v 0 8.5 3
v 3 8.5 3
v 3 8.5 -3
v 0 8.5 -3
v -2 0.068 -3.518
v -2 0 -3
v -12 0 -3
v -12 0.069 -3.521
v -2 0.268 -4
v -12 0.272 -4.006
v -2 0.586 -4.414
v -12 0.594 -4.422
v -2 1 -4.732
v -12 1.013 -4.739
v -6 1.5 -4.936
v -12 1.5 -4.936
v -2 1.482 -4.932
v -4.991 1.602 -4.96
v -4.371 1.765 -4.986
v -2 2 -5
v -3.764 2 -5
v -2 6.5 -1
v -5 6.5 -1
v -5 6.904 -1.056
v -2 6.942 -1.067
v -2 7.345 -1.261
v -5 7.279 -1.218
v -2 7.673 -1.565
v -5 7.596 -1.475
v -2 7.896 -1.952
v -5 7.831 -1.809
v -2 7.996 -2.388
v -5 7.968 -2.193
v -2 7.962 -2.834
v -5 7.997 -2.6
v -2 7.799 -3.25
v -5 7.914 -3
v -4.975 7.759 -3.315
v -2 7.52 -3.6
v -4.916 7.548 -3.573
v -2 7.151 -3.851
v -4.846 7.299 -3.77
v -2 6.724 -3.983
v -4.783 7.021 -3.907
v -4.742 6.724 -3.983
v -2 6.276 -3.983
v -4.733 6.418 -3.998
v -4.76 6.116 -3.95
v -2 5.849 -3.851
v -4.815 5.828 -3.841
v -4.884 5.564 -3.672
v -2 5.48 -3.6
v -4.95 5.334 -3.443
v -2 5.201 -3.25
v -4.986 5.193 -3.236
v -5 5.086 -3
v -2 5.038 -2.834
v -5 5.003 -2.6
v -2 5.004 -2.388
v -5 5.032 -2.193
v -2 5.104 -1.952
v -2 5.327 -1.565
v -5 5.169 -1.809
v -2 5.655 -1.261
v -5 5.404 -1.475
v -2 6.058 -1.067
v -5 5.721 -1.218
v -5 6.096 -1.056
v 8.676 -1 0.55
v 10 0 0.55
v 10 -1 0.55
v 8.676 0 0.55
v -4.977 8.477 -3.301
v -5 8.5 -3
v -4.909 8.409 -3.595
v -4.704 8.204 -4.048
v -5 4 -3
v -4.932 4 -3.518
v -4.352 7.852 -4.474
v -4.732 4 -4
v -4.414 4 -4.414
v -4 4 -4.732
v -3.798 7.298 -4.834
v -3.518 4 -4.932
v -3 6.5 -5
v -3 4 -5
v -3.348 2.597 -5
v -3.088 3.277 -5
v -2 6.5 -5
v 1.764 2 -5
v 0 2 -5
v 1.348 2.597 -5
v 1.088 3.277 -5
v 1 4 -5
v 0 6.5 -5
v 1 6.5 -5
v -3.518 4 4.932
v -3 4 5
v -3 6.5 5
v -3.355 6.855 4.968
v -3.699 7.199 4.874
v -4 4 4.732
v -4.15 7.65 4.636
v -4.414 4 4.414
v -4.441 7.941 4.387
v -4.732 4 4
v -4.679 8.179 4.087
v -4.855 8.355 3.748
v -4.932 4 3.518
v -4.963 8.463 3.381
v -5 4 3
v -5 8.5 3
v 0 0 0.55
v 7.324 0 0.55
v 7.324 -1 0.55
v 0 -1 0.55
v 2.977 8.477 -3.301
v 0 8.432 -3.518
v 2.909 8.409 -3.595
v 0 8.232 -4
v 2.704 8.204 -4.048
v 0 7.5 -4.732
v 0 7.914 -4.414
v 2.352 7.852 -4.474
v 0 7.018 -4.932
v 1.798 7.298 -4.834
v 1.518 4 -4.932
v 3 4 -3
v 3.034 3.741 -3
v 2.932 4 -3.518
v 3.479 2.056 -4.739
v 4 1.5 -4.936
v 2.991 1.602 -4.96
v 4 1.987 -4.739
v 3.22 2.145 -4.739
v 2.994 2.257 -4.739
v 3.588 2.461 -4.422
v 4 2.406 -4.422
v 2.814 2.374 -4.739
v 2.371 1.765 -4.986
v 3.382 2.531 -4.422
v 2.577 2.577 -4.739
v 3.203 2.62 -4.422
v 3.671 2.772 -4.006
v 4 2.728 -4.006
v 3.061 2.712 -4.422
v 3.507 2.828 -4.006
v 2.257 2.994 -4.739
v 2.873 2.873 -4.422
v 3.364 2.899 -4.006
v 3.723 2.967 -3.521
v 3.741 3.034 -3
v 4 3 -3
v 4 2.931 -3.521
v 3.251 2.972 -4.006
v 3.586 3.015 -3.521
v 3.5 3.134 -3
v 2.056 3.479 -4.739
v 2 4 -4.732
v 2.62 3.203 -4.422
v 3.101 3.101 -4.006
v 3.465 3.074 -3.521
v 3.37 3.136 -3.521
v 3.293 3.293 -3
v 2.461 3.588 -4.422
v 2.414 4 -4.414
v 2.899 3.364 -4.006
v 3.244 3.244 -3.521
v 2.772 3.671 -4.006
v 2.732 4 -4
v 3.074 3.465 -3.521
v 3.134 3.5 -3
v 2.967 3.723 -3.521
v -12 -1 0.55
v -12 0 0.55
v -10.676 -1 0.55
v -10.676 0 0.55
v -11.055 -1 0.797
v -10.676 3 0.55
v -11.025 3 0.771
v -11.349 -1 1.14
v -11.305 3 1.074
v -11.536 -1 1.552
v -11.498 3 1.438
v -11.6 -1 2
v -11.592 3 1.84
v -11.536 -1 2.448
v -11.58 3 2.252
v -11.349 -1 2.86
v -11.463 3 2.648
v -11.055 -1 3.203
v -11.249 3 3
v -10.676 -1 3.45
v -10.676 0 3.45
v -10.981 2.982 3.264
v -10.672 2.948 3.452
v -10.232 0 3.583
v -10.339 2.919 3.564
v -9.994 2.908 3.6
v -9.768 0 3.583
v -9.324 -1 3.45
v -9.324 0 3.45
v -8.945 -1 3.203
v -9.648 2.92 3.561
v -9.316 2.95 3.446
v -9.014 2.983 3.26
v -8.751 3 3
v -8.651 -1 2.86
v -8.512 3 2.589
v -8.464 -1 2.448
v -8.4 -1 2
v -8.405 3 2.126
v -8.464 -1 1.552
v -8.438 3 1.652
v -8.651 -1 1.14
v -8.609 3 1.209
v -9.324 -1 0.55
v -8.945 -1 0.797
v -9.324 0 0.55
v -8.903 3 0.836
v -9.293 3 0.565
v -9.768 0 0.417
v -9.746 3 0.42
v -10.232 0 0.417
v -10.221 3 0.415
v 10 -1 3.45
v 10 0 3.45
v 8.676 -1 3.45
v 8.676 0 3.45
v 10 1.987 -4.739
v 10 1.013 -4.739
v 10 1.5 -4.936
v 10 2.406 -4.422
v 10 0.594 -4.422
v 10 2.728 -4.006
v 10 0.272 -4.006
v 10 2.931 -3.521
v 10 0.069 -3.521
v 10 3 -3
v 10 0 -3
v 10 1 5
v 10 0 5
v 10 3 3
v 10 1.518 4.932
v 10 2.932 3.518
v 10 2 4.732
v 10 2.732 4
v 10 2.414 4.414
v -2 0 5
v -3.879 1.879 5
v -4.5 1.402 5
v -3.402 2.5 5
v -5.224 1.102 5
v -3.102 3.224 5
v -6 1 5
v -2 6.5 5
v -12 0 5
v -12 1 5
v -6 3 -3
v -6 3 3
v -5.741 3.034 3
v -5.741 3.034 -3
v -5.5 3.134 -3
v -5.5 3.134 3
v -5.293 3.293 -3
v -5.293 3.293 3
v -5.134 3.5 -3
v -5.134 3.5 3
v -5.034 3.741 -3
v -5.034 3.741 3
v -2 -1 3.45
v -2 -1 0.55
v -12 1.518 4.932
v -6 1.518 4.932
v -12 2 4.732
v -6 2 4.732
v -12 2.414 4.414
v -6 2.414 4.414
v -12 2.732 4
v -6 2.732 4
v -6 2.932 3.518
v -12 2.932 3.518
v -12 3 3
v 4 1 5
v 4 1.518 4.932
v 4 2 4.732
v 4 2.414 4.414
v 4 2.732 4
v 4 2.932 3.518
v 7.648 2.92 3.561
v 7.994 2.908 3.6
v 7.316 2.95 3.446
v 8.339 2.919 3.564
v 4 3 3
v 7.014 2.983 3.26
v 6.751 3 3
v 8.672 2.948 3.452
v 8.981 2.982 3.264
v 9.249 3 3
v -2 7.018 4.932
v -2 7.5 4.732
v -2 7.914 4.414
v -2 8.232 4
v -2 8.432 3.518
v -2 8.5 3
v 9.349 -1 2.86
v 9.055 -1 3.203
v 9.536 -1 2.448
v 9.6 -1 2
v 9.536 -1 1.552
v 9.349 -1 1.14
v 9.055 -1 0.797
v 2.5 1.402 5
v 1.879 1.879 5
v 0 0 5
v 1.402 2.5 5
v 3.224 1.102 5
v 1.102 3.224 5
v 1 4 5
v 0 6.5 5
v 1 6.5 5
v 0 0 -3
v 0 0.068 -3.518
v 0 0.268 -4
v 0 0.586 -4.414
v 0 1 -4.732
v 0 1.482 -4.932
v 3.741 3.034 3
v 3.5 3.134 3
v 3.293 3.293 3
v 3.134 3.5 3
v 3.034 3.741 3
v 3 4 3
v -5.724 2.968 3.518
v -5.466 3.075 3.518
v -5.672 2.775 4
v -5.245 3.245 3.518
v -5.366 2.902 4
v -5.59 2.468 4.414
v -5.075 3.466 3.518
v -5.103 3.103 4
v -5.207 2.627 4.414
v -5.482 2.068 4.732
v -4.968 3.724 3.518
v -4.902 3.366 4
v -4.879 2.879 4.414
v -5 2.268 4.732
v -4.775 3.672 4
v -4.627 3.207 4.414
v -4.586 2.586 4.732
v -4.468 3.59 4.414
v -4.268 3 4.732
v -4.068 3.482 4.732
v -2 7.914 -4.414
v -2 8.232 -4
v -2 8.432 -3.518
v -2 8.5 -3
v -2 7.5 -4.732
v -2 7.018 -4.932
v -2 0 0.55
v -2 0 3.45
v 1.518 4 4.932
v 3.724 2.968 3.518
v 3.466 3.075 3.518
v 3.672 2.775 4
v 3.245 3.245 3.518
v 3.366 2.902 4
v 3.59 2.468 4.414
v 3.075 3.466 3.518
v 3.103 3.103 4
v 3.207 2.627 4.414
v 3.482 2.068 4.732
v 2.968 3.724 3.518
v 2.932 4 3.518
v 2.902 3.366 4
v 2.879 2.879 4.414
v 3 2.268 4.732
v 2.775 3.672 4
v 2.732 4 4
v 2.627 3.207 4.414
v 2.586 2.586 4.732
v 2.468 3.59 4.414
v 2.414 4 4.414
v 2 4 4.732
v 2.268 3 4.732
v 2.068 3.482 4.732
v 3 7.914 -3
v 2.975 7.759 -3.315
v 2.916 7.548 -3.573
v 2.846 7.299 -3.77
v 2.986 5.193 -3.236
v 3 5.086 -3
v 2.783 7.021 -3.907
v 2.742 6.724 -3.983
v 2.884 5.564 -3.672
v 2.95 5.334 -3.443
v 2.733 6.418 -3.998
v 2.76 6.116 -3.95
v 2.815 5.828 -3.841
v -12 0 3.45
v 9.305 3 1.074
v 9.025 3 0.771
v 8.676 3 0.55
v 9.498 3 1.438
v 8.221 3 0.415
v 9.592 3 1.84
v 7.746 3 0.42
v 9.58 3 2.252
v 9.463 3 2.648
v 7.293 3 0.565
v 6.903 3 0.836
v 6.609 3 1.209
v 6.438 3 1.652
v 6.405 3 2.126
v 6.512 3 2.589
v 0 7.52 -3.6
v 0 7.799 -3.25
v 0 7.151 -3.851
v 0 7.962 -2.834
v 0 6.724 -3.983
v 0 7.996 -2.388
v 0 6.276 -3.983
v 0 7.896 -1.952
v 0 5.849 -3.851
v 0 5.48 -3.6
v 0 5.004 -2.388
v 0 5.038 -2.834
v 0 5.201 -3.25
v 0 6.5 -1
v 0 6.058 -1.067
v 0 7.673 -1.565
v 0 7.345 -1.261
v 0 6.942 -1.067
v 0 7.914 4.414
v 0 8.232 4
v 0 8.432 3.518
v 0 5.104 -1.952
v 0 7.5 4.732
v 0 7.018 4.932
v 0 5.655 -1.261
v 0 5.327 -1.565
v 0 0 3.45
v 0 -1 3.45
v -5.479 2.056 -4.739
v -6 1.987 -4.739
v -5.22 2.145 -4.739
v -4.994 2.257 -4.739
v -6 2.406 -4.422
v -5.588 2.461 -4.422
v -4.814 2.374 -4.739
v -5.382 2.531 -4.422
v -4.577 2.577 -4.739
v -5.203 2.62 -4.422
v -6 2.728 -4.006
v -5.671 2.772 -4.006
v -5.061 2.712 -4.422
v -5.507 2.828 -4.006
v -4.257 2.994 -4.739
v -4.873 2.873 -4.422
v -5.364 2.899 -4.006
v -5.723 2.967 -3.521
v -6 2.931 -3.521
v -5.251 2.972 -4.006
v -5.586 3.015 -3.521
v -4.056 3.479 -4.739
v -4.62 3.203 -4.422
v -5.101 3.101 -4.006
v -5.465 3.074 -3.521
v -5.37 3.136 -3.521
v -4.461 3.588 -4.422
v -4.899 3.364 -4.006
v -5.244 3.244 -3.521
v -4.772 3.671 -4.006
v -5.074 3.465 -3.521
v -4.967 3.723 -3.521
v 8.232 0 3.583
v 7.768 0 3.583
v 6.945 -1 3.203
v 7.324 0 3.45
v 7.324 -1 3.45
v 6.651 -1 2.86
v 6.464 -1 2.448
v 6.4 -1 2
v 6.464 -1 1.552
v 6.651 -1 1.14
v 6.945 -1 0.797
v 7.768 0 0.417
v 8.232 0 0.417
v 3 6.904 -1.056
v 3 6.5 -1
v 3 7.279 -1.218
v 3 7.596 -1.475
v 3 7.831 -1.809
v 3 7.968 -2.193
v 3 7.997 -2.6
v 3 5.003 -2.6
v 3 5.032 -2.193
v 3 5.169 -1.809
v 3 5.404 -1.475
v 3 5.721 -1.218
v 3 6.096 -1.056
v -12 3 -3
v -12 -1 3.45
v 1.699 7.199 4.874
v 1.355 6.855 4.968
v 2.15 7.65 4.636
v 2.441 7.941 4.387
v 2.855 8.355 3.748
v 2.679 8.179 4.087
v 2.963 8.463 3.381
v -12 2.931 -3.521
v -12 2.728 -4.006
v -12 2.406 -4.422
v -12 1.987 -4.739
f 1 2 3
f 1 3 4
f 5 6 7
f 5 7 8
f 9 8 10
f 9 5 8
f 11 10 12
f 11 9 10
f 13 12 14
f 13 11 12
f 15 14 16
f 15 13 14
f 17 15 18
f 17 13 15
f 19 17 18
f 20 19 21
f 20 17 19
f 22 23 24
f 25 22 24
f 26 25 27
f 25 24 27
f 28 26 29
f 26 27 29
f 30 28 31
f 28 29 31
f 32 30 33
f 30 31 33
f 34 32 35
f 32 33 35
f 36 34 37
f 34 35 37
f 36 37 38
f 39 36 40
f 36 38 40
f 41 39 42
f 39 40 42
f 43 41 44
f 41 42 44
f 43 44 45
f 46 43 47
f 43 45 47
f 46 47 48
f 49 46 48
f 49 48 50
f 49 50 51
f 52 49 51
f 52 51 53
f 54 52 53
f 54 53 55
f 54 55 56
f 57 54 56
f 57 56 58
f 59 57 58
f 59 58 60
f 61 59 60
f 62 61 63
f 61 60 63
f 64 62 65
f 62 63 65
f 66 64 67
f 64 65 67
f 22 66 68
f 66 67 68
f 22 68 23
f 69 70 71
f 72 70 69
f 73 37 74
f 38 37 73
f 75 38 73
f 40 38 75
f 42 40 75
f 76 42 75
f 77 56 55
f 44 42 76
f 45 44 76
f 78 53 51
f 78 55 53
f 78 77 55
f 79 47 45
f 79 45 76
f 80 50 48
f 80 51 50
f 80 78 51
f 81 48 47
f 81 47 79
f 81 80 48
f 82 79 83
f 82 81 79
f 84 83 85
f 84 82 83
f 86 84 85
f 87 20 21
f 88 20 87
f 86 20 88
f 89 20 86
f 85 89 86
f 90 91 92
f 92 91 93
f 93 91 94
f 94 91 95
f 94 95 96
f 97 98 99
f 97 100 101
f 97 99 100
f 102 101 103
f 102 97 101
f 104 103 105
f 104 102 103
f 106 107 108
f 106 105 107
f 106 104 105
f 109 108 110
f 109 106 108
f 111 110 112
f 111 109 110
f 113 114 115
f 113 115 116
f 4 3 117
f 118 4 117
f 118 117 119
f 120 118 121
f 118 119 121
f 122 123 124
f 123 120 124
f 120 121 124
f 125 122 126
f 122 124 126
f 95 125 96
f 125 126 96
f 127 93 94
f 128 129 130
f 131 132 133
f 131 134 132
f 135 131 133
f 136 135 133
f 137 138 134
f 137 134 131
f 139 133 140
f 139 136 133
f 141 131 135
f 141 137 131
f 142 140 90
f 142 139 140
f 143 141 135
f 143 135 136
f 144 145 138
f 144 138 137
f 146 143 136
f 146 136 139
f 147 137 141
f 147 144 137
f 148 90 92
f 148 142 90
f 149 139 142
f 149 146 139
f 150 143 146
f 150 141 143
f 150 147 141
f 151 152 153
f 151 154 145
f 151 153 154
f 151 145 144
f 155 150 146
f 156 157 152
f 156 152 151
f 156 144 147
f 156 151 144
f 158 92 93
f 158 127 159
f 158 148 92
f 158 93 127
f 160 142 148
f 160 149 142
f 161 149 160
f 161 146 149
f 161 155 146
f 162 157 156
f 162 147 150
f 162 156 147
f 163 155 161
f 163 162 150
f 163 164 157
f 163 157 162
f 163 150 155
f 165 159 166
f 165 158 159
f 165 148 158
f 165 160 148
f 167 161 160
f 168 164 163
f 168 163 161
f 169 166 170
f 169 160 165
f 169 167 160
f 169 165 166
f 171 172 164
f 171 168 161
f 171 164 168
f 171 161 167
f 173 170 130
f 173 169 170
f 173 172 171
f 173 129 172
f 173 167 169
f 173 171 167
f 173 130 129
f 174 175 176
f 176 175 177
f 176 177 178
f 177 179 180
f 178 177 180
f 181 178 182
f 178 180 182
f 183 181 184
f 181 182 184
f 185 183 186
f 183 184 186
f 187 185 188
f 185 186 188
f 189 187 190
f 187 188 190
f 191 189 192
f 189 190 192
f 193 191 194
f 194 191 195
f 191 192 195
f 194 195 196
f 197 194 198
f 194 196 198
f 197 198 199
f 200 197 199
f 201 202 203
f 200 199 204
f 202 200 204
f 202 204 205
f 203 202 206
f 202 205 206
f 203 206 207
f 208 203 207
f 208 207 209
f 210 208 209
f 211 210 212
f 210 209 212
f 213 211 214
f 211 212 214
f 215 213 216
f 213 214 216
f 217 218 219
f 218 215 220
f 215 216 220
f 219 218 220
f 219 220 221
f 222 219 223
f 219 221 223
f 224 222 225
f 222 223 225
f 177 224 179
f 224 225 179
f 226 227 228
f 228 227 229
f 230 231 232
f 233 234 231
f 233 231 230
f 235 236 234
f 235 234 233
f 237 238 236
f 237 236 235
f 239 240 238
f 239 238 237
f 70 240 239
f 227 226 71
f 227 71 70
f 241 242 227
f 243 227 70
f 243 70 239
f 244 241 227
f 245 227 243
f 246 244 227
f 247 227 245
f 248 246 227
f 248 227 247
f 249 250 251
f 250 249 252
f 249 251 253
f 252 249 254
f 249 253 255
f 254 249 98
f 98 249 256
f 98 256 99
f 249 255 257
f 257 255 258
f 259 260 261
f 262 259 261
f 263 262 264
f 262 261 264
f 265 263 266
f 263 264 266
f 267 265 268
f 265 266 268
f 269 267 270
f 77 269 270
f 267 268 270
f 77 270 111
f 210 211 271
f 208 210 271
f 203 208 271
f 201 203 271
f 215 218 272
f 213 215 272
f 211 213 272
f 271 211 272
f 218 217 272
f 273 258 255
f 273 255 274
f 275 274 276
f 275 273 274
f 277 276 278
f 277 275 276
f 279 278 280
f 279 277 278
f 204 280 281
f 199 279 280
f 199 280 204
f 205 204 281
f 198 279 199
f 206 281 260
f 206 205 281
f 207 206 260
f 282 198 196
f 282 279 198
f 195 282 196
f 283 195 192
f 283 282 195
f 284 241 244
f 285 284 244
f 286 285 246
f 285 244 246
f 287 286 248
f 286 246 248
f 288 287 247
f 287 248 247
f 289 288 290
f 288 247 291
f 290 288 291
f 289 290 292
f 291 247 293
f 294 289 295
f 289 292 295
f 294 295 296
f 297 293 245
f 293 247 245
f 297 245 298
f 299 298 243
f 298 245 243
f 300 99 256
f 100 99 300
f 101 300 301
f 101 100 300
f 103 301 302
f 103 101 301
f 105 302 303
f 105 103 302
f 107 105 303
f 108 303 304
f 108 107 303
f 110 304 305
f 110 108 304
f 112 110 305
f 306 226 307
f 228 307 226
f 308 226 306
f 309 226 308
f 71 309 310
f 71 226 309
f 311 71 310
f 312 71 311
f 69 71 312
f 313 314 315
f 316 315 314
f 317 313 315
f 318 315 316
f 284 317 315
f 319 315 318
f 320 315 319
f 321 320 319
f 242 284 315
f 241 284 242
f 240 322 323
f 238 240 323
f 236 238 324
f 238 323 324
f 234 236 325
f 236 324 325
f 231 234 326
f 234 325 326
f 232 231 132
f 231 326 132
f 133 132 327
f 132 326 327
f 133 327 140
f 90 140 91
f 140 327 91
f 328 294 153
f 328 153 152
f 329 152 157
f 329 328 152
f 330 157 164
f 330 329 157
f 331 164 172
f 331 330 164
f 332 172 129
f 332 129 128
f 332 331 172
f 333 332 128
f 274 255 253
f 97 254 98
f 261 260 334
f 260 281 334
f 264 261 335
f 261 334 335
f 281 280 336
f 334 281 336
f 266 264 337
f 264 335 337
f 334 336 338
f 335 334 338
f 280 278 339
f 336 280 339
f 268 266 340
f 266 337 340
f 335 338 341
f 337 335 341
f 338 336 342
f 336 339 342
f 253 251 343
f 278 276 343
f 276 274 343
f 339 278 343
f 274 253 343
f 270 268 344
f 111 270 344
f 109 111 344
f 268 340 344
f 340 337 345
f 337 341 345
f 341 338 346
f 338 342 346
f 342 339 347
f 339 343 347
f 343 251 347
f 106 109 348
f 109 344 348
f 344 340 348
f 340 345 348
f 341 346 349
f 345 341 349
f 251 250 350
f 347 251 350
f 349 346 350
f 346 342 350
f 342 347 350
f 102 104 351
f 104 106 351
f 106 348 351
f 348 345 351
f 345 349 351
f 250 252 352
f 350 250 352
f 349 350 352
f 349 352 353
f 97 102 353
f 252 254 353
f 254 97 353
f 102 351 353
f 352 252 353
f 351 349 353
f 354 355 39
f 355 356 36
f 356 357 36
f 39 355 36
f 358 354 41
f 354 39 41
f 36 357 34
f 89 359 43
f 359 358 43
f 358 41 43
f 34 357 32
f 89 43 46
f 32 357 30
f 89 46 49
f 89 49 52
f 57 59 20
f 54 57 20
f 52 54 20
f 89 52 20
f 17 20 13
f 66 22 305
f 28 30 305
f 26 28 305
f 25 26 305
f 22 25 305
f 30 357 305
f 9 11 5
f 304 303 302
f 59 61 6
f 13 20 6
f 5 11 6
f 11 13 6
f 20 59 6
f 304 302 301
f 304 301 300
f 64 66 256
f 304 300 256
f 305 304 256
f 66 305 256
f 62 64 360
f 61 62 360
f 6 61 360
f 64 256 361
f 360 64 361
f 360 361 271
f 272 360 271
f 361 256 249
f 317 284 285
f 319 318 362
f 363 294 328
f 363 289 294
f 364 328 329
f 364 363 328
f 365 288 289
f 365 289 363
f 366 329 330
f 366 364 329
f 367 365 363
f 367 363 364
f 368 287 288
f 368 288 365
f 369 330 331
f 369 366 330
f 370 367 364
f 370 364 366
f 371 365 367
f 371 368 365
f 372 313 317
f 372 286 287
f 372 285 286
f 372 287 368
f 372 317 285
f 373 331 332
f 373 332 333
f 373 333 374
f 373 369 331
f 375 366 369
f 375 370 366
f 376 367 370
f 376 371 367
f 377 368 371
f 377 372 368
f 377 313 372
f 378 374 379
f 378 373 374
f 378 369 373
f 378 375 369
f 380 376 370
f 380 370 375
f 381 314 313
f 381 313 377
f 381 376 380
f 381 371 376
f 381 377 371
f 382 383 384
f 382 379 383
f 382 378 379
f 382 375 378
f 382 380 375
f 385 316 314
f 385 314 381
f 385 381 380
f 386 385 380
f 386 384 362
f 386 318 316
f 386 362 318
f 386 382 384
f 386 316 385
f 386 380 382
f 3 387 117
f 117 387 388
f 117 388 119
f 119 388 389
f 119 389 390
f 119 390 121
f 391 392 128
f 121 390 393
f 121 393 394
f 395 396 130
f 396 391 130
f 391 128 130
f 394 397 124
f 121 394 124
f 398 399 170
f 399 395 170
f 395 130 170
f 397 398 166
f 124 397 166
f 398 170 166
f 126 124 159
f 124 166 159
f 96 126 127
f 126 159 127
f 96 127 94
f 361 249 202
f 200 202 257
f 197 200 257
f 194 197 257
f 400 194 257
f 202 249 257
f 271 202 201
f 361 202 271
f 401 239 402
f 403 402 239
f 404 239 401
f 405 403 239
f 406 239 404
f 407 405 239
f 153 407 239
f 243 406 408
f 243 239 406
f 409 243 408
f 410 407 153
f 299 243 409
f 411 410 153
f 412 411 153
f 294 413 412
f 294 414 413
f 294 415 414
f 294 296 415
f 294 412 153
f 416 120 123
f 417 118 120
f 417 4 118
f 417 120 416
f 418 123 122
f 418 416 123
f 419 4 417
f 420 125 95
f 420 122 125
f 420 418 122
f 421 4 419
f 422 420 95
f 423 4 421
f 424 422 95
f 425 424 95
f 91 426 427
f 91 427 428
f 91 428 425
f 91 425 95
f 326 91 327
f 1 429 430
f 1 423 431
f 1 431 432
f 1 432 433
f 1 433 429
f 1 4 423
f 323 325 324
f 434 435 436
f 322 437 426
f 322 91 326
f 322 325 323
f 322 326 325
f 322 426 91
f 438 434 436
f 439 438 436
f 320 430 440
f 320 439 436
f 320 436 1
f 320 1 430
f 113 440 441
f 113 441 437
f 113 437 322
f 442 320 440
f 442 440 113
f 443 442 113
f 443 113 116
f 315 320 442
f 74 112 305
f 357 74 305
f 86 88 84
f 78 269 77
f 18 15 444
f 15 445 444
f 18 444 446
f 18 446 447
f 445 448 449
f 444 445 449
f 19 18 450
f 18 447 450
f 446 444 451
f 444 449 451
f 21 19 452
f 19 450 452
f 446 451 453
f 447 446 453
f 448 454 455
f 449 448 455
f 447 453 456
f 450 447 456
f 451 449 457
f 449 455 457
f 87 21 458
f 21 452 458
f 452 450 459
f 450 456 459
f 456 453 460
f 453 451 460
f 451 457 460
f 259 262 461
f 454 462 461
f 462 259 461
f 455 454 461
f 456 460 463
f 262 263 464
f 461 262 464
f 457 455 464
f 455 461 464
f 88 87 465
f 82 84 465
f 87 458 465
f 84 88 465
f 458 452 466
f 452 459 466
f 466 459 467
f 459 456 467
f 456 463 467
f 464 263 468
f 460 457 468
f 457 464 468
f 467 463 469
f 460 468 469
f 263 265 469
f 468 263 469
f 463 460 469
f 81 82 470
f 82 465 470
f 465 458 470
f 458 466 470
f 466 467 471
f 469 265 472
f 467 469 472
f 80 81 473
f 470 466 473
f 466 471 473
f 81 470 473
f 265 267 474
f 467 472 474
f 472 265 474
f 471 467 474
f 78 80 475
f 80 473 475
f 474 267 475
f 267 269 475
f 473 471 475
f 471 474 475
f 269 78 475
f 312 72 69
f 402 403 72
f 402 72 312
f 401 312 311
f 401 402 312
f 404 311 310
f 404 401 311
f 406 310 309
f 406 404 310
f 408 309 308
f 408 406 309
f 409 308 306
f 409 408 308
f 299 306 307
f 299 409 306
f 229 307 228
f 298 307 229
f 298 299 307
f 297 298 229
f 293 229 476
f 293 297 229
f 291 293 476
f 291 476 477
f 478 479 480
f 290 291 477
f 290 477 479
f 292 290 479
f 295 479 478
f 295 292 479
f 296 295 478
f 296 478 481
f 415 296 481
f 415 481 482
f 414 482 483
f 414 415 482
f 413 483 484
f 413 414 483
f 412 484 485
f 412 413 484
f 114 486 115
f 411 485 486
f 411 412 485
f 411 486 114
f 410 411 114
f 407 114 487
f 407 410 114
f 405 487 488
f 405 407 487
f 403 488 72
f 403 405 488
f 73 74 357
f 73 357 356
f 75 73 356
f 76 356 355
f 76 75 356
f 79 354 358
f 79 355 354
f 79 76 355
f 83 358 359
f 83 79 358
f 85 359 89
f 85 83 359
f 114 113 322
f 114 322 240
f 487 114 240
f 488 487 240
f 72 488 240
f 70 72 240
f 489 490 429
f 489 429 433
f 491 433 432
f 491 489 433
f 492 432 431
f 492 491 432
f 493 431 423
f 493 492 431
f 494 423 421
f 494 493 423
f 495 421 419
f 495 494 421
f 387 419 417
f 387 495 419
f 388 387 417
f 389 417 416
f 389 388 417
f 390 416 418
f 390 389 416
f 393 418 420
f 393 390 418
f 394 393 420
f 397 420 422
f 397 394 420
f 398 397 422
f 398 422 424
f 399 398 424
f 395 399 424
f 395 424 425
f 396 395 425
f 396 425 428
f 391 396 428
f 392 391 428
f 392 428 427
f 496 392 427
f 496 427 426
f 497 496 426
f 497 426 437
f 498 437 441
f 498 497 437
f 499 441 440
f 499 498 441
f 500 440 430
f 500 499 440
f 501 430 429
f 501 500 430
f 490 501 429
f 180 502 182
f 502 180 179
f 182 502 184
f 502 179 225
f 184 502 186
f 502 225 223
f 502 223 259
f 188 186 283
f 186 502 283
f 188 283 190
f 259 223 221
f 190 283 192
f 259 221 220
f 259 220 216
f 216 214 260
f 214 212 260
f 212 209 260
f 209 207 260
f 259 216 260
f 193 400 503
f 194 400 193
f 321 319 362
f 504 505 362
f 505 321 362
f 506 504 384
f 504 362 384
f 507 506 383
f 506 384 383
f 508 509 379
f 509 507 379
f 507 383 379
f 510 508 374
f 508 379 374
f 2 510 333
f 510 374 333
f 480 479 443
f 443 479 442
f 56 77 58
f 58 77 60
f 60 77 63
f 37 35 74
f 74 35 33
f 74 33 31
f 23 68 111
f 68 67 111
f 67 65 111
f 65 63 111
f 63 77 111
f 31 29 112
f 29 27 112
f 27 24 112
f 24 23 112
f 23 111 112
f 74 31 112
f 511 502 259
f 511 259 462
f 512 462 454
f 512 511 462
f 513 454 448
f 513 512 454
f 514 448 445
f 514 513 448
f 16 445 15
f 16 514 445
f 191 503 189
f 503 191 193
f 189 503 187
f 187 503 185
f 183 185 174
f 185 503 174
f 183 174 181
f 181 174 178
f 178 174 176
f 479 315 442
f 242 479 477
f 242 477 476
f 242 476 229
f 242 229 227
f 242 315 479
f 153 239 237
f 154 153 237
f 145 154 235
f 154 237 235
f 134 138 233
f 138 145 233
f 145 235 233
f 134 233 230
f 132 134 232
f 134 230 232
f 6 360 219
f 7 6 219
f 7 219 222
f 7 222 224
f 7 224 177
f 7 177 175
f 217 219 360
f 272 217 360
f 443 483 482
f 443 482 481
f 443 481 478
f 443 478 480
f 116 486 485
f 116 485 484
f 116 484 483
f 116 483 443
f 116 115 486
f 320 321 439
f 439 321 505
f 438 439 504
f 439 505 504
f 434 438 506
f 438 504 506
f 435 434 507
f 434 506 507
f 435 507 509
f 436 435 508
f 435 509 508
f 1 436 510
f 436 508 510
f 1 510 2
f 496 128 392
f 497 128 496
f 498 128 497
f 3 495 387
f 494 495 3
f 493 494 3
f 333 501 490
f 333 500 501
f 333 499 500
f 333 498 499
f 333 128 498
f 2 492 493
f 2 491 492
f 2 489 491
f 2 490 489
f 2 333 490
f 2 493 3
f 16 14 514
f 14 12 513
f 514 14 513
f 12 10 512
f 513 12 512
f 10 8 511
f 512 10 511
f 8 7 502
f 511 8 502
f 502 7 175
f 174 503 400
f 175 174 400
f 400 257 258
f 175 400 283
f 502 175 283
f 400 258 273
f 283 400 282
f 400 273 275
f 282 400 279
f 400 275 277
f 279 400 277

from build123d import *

# Parameters (mm, degrees)
MAIN_DEPTH               = 5
VERTICALHOLE_DEPTH       = 15.044571905
VERTICALHOLE_DEPTH_BACK  = 15.044571905
ESQUISSE2_R              = 1.5
ESQUISSE5_W              = 10
ESQUISSE5_H              = 2.9
MAKERBEAMSUPPORT_DEPTH   = 1
MAKERBEAMHOLE_DEPTH      = 15.044571905
MAKERBEAMHOLE_DEPTH_BACK = 15.044571905
ESQUISSE3_R              = 1.6
FILLET1_R                = 2


with BuildPart() as part:
    # Esquisse1 → Main (new, symmetric)
    with BuildSketch(Plane.XY):
        with BuildLine():
            Line((0, 0), (10, 0))
            Line((10, 0), (10, 3))
            Line((10, 3), (4, 3))
            ThreePointArc((4, 3), (3.292893219, 3.292893219), (3, 4))
            Line((3, 4), (3, 8.5))
            Line((3, 8.5), (0, 8.5))
            Line((0, 8.5), (0, 0))
        make_face()
    extrude(amount=MAIN_DEPTH, both=True)

    # Esquisse2 → VerticalHole (cut, two sides: drawn at the far end of the back side and taken through both)
    with BuildSketch(Plane.ZY.offset(-VERTICALHOLE_DEPTH_BACK)):
        with Locations((-2.5, 6.5)):
            Circle(ESQUISSE2_R)
    extrude(amount=VERTICALHOLE_DEPTH + VERTICALHOLE_DEPTH_BACK, mode=Mode.SUBTRACT)

    # Esquisse5 → MakerBeamSupport (add)
    with BuildSketch(Plane(origin=(0, 0, 0), x_dir=(-1, 0, 0), z_dir=(0, -1, 0))):
        with Locations((-5, -2)):
            Rectangle(ESQUISSE5_W, ESQUISSE5_H)
    extrude(amount=MAKERBEAMSUPPORT_DEPTH)

    # Esquisse3 → MakerBeamHole (cut, two sides: drawn at the far end of the back side and taken through both)
    with BuildSketch(Plane.XZ.offset(-MAKERBEAMHOLE_DEPTH_BACK)):
        with Locations(Location((8, 2, 0), (0, 0, 295.007833235))):
            Circle(ESQUISSE3_R)
    extrude(amount=MAKERBEAMHOLE_DEPTH + MAKERBEAMHOLE_DEPTH_BACK, mode=Mode.SUBTRACT)

    # Fillet1
    # the kernel refuses this fillet: 2 mm, written as the material it takes off along each edge
    with BuildSketch(Plane(origin=(3, 4, -5), x_dir=(-1, 0, 0), z_dir=(0, 1, 0))) as fillet1_piece_1:
        with BuildLine():
            CenterArc((FILLET1_R, FILLET1_R), FILLET1_R, 180, 90)
            Line((0, FILLET1_R), (0, 0))
            Line((0, 0), (FILLET1_R, 0))
        make_face()
    extrude(amount=9.5, mode=Mode.SUBTRACT)
    with BuildSketch(Plane(origin=(4, 4, -5), x_dir=(0, -1, 0), z_dir=(1, 0, 0))) as fillet1_piece_2:
        with BuildLine():
            CenterArc((1 + FILLET1_R, -FILLET1_R), FILLET1_R, 90, 90)
            Line((1, -FILLET1_R), (1, 0))
            Line((1, 0), (1 + FILLET1_R, 0))
        make_face()
    revolve(axis=Axis((4, 4, -5), (0, 0, -1)), revolution_arc=90, mode=Mode.SUBTRACT)
    with BuildSketch(Plane(origin=(3, 4, 5), x_dir=(-1, 0, 0), z_dir=(0, 1, 0))) as fillet1_piece_3:
        with BuildLine():
            CenterArc((FILLET1_R, -FILLET1_R), FILLET1_R, 90, 90)
            Line((0, -FILLET1_R), (0, 0))
            Line((0, 0), (FILLET1_R, 0))
        make_face()
    extrude(amount=9.5, mode=Mode.SUBTRACT)
    with BuildSketch(Plane(origin=(4, 4, 5), x_dir=(0, -1, 0), z_dir=(1, 0, 0))) as fillet1_piece_4:
        with BuildLine():
            CenterArc((1 + FILLET1_R, FILLET1_R), FILLET1_R, 180, 90)
            Line((1, FILLET1_R), (1, 0))
            Line((1, 0), (1 + FILLET1_R, 0))
        make_face()
    revolve(axis=Axis((4, 4, 5), (0, 0, -1)), revolution_arc=90, mode=Mode.SUBTRACT)
    with BuildSketch(Plane(origin=(15, 3, -5), x_dir=(0, -1, 0), z_dir=(-1, 0, 0)), Plane(origin=(15, 3, 5), x_dir=(0, 0, -1), z_dir=(-1, 0, 0))) as fillet1_piece_5:
        with BuildLine():
            CenterArc((FILLET1_R, FILLET1_R), FILLET1_R, 180, 90)
            Line((0, FILLET1_R), (0, 0))
            Line((0, 0), (FILLET1_R, 0))
        make_face()
    extrude(amount=11, mode=Mode.SUBTRACT)
    with BuildSketch(Plane(origin=(8, 8.5, -5), x_dir=(0, -1, 0), z_dir=(-1, 0, 0))) as fillet1_piece_6:
        with BuildLine():
            CenterArc((FILLET1_R, FILLET1_R), FILLET1_R, 180, 90)
            Line((0, FILLET1_R), (0, 0))
            Line((0, 0), (FILLET1_R, 0))
        make_face()
    extrude(amount=13, mode=Mode.SUBTRACT)
    with BuildSketch(Plane(origin=(8, 8.5, 5), x_dir=(0, -1, 0), z_dir=(-1, 0, 0))) as fillet1_piece_7:
        with BuildLine():
            CenterArc((FILLET1_R, -FILLET1_R), FILLET1_R, 90, 90)
            Line((0, -FILLET1_R), (0, 0))
            Line((0, 0), (FILLET1_R, 0))
        make_face()
    extrude(amount=13, mode=Mode.SUBTRACT)
    with BuildSketch(Plane(origin=(-5, 0, -5), x_dir=(0, 0, 1), z_dir=(1, 0, 0))) as fillet1_piece_8:
        with BuildLine():
            CenterArc((FILLET1_R, -FILLET1_R), FILLET1_R, 90, 90)
            Line((0, -FILLET1_R), (0, 0))
            Line((0, 0), (FILLET1_R, 0))
        make_face()
    extrude(amount=20, mode=Mode.SUBTRACT)


with BuildPart() as body_2:
    # Mirror2: mirrored copy
    add(part.part.mirror(Plane.ZY.offset(1)))


solid = Compound([part.part, body_2.part])
